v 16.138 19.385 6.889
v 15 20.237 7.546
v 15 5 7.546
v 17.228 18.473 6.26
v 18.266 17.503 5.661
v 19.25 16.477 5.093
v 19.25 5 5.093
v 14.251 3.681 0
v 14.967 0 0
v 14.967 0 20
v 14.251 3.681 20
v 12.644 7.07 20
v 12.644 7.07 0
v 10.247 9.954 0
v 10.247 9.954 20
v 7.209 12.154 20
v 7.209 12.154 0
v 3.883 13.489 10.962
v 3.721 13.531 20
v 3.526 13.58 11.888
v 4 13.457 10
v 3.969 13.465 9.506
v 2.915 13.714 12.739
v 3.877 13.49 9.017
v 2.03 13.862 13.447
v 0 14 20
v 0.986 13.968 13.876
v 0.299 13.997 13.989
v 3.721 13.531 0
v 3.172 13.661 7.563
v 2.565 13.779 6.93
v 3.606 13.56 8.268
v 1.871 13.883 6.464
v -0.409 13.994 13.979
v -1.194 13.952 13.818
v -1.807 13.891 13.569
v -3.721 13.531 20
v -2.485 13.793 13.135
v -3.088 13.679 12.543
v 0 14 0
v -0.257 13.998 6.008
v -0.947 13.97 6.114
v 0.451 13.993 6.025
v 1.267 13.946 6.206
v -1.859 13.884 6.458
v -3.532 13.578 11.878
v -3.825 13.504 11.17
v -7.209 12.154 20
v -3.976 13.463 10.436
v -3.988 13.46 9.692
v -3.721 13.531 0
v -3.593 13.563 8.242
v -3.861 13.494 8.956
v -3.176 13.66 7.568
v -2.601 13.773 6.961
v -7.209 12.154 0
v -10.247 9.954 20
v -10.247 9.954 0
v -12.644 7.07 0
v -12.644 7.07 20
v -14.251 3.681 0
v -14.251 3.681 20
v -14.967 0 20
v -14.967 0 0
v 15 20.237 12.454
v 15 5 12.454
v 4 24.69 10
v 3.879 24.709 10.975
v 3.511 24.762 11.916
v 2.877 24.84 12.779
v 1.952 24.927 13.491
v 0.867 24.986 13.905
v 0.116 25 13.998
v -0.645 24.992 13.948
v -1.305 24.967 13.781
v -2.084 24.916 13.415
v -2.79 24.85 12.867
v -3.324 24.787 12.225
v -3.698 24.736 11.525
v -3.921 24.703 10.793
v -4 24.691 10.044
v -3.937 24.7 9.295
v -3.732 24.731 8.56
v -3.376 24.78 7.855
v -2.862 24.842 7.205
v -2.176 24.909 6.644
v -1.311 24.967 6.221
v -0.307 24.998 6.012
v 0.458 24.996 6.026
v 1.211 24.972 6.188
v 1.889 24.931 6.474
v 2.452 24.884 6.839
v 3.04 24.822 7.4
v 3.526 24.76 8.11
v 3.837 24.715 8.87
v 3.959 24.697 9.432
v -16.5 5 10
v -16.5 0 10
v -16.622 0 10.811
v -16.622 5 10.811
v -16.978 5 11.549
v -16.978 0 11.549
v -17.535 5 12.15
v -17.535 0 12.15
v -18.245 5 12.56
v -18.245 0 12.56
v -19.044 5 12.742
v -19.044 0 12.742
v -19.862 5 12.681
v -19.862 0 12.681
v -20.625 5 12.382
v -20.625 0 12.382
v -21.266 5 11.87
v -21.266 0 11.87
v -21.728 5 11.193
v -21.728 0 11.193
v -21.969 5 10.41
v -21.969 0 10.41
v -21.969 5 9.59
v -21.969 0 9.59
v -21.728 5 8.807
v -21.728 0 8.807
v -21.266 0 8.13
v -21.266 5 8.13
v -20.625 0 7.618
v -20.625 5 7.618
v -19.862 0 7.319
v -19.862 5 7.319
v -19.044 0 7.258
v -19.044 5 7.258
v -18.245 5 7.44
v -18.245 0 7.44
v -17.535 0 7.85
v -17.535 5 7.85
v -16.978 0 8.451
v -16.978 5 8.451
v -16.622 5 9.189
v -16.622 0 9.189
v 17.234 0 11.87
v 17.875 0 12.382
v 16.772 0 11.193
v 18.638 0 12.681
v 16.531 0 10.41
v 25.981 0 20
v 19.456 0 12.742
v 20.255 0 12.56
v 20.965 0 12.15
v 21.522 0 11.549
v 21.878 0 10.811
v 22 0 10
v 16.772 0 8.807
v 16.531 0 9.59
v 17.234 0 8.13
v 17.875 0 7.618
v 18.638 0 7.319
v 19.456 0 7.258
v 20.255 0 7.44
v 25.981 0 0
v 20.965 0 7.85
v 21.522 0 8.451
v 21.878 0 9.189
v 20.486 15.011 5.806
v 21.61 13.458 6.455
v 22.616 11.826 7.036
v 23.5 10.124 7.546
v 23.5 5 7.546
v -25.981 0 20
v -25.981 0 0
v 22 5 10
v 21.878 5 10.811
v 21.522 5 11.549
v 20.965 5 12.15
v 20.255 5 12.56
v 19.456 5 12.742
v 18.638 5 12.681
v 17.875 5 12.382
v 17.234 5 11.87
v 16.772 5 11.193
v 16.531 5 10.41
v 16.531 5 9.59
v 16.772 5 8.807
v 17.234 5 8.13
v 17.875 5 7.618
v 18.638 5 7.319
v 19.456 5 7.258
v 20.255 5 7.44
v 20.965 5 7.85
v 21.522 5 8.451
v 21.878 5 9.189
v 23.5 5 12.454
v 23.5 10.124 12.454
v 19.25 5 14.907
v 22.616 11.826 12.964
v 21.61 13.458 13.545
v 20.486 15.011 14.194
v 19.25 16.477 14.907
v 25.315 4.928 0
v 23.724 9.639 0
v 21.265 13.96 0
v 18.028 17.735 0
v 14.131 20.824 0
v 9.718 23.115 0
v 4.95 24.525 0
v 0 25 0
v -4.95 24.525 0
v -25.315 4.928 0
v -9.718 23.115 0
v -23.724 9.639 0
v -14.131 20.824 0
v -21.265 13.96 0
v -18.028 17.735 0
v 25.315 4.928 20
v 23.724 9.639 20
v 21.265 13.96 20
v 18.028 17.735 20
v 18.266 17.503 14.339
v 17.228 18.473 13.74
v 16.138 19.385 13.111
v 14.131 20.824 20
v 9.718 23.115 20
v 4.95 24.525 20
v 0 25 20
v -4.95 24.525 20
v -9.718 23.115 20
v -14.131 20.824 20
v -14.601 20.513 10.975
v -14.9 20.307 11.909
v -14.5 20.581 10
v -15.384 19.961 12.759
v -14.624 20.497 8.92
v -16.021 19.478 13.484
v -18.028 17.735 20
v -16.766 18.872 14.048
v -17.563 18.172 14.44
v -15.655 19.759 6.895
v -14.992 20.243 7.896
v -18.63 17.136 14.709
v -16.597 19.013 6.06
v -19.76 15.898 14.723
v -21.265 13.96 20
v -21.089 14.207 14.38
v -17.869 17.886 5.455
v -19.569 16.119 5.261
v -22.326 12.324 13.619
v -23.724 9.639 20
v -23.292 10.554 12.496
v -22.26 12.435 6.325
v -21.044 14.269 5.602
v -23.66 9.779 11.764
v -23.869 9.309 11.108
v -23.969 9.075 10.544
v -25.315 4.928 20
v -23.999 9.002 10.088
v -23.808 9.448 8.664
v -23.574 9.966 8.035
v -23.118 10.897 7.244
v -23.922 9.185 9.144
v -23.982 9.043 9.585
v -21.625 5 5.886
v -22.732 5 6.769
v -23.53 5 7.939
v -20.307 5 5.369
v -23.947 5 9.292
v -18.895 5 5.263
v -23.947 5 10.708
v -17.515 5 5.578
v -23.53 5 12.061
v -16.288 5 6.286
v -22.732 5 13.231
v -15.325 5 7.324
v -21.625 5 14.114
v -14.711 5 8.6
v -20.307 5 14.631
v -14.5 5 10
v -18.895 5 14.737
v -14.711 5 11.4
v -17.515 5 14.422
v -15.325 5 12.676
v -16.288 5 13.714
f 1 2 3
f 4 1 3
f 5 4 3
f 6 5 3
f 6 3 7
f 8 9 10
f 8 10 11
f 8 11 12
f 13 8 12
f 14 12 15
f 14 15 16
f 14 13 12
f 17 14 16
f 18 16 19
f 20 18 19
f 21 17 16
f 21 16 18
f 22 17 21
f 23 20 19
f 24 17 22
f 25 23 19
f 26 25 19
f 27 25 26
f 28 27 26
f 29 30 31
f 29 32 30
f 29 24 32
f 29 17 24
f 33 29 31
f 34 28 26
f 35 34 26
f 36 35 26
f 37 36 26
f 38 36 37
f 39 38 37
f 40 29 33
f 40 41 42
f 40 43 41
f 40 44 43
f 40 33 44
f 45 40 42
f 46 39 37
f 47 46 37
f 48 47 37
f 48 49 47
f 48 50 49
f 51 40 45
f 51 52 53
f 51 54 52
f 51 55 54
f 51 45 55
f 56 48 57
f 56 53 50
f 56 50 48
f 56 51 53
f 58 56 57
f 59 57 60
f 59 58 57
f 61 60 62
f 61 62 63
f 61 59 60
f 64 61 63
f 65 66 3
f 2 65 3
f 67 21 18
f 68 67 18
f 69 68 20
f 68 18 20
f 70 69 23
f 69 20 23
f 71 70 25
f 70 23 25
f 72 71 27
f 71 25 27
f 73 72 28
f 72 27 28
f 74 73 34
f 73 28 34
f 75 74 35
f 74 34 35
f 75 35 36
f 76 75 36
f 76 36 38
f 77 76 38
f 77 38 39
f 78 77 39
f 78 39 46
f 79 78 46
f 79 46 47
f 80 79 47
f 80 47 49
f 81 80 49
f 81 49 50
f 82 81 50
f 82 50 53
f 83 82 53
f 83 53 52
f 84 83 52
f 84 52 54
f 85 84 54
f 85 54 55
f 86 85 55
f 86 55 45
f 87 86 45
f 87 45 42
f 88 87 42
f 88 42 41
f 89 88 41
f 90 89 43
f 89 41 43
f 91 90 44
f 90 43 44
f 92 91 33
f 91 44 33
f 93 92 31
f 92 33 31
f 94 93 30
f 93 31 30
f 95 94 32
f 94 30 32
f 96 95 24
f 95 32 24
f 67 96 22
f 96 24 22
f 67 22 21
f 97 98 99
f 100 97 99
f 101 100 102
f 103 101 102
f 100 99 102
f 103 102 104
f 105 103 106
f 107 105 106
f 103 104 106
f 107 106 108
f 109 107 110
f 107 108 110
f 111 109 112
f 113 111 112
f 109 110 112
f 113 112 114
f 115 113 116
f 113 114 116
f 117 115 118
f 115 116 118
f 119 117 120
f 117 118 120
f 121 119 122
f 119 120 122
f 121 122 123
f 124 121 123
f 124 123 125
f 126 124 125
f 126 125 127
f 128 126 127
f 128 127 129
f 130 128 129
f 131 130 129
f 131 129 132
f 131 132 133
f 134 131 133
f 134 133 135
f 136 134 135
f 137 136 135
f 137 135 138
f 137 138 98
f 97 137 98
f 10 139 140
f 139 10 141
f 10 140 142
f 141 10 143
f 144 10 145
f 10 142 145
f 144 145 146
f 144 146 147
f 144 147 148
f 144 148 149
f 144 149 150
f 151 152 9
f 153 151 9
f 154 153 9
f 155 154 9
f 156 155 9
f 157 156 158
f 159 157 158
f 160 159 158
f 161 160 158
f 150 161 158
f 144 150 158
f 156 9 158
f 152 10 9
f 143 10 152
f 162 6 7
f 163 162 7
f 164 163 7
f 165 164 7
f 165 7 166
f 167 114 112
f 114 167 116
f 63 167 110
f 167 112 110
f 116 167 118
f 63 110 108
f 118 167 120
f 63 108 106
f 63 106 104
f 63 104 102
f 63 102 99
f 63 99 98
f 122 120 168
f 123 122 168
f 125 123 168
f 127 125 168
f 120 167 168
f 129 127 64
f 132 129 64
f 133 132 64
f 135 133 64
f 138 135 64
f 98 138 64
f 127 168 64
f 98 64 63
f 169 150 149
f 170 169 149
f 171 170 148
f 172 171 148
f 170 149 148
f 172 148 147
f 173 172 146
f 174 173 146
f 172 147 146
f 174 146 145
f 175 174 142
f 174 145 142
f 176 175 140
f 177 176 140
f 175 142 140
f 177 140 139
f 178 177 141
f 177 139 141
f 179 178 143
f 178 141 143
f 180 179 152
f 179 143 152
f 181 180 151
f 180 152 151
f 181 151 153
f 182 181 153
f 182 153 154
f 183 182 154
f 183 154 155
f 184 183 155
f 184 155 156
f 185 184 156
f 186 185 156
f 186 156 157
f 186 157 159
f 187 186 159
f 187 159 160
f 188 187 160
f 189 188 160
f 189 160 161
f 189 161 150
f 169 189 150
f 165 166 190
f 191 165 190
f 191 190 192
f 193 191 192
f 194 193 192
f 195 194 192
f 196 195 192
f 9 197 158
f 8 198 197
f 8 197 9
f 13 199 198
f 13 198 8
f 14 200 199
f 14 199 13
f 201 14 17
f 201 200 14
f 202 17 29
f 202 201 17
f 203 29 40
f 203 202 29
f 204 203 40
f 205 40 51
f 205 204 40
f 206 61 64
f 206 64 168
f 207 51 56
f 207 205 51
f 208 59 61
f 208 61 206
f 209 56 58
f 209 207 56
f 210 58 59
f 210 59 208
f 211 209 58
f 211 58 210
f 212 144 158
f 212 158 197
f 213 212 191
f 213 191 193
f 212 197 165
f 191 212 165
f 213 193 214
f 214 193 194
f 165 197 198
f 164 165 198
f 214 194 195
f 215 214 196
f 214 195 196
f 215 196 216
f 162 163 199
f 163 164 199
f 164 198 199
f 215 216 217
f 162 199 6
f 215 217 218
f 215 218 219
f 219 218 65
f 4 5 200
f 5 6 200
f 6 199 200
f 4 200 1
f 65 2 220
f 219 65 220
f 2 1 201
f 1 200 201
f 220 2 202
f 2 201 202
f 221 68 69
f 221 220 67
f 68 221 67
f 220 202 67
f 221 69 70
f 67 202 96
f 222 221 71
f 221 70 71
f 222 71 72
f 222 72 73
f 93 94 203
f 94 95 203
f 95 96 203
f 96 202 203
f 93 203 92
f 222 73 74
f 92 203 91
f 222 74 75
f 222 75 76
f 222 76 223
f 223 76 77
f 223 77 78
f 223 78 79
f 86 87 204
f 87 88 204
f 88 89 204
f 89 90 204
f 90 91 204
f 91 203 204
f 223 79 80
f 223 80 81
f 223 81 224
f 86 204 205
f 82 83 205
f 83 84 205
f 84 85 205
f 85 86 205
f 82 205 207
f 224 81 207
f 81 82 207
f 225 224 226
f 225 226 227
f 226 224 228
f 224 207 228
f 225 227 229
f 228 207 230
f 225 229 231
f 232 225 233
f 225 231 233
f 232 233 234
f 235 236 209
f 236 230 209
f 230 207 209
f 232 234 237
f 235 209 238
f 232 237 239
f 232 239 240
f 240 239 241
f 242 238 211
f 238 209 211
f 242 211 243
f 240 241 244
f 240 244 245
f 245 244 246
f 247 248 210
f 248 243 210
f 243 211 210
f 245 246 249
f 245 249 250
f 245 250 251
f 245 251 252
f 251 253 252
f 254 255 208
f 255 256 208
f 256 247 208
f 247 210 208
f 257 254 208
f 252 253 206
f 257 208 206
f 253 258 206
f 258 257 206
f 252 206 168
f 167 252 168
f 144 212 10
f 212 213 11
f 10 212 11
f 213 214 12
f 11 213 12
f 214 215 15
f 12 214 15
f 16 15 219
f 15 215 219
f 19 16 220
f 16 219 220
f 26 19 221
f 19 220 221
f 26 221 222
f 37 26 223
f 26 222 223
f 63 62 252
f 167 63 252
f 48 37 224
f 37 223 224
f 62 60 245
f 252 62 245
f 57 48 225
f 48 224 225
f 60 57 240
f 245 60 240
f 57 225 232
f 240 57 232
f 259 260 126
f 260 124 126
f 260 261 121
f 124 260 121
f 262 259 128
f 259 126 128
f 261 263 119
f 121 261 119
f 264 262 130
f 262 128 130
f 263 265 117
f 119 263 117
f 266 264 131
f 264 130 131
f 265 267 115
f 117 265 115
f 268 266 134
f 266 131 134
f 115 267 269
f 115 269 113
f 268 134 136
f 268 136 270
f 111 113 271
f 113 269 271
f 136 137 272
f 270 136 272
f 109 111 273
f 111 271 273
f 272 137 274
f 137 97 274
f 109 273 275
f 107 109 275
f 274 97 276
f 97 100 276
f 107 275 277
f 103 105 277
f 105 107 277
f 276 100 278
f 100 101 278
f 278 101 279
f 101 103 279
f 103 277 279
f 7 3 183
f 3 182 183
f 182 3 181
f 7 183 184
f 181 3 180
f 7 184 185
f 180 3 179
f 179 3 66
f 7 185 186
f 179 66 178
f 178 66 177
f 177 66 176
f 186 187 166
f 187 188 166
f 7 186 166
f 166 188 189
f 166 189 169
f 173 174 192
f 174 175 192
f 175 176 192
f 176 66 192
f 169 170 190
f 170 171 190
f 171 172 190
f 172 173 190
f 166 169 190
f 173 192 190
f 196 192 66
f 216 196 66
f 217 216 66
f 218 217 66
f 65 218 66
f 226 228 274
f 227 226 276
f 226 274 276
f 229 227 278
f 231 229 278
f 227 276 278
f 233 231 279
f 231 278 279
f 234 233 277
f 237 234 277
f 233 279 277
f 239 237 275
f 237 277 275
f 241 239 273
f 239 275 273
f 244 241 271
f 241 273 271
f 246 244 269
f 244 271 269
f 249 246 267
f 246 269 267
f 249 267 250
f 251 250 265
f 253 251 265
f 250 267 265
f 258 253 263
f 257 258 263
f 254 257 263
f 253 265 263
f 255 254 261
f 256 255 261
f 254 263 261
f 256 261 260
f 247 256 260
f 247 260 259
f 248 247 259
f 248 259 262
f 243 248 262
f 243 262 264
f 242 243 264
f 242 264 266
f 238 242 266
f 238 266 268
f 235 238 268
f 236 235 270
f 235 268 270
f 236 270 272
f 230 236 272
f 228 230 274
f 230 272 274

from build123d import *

# Parameters (mm, degrees)
PAD_DEPTH       = 20
SKETCH001_R     = 2.75
SKETCH001_R_2   = 4
POCKET_DEPTH    = 25.001
SKETCH002_R     = 4.75
POCKET001_DEPTH = 20.001


with BuildPart() as part:
    # Sketch → Pad (new body)
    with BuildSketch(Plane.XY):
        with BuildLine():
            ThreePointArc((14.96663, 0), (0, 14), (-14.96663, 0))
            Line((-25.980762, 0), (-14.96663, 0))
            ThreePointArc((25.980762, 0), (0, 25), (-25.980762, 0))
            Line((14.96663, 0), (25.980762, 0))
        make_face()
    extrude(amount=PAD_DEPTH)

    # Sketch001 (on Face2 of Pad) → Pocket (cut, through all)
    with BuildSketch(Plane.XZ):
        with Locations((-19.25, 10)):
            Circle(SKETCH001_R)
        with Locations((19.25, 10)):
            Circle(SKETCH001_R)
        with Locations((0, 10)):
            Circle(SKETCH001_R_2)
    extrude(amount=-POCKET_DEPTH, mode=Mode.SUBTRACT)

    # Sketch002 (on DatumPlane) → Pocket001 (cut, through all)
    with BuildSketch(Plane.XZ.offset(-5)):
        with Locations((-19.25, 10)):
            Circle(SKETCH002_R)
        Polygon((19.25, 5.092523), (23.5, 7.546261), (23.5, 12.453739), (19.25, 14.907477), (15, 12.453739), (15, 7.546261), align=None)
    extrude(amount=-POCKET001_DEPTH, mode=Mode.SUBTRACT)


solid = part.part
